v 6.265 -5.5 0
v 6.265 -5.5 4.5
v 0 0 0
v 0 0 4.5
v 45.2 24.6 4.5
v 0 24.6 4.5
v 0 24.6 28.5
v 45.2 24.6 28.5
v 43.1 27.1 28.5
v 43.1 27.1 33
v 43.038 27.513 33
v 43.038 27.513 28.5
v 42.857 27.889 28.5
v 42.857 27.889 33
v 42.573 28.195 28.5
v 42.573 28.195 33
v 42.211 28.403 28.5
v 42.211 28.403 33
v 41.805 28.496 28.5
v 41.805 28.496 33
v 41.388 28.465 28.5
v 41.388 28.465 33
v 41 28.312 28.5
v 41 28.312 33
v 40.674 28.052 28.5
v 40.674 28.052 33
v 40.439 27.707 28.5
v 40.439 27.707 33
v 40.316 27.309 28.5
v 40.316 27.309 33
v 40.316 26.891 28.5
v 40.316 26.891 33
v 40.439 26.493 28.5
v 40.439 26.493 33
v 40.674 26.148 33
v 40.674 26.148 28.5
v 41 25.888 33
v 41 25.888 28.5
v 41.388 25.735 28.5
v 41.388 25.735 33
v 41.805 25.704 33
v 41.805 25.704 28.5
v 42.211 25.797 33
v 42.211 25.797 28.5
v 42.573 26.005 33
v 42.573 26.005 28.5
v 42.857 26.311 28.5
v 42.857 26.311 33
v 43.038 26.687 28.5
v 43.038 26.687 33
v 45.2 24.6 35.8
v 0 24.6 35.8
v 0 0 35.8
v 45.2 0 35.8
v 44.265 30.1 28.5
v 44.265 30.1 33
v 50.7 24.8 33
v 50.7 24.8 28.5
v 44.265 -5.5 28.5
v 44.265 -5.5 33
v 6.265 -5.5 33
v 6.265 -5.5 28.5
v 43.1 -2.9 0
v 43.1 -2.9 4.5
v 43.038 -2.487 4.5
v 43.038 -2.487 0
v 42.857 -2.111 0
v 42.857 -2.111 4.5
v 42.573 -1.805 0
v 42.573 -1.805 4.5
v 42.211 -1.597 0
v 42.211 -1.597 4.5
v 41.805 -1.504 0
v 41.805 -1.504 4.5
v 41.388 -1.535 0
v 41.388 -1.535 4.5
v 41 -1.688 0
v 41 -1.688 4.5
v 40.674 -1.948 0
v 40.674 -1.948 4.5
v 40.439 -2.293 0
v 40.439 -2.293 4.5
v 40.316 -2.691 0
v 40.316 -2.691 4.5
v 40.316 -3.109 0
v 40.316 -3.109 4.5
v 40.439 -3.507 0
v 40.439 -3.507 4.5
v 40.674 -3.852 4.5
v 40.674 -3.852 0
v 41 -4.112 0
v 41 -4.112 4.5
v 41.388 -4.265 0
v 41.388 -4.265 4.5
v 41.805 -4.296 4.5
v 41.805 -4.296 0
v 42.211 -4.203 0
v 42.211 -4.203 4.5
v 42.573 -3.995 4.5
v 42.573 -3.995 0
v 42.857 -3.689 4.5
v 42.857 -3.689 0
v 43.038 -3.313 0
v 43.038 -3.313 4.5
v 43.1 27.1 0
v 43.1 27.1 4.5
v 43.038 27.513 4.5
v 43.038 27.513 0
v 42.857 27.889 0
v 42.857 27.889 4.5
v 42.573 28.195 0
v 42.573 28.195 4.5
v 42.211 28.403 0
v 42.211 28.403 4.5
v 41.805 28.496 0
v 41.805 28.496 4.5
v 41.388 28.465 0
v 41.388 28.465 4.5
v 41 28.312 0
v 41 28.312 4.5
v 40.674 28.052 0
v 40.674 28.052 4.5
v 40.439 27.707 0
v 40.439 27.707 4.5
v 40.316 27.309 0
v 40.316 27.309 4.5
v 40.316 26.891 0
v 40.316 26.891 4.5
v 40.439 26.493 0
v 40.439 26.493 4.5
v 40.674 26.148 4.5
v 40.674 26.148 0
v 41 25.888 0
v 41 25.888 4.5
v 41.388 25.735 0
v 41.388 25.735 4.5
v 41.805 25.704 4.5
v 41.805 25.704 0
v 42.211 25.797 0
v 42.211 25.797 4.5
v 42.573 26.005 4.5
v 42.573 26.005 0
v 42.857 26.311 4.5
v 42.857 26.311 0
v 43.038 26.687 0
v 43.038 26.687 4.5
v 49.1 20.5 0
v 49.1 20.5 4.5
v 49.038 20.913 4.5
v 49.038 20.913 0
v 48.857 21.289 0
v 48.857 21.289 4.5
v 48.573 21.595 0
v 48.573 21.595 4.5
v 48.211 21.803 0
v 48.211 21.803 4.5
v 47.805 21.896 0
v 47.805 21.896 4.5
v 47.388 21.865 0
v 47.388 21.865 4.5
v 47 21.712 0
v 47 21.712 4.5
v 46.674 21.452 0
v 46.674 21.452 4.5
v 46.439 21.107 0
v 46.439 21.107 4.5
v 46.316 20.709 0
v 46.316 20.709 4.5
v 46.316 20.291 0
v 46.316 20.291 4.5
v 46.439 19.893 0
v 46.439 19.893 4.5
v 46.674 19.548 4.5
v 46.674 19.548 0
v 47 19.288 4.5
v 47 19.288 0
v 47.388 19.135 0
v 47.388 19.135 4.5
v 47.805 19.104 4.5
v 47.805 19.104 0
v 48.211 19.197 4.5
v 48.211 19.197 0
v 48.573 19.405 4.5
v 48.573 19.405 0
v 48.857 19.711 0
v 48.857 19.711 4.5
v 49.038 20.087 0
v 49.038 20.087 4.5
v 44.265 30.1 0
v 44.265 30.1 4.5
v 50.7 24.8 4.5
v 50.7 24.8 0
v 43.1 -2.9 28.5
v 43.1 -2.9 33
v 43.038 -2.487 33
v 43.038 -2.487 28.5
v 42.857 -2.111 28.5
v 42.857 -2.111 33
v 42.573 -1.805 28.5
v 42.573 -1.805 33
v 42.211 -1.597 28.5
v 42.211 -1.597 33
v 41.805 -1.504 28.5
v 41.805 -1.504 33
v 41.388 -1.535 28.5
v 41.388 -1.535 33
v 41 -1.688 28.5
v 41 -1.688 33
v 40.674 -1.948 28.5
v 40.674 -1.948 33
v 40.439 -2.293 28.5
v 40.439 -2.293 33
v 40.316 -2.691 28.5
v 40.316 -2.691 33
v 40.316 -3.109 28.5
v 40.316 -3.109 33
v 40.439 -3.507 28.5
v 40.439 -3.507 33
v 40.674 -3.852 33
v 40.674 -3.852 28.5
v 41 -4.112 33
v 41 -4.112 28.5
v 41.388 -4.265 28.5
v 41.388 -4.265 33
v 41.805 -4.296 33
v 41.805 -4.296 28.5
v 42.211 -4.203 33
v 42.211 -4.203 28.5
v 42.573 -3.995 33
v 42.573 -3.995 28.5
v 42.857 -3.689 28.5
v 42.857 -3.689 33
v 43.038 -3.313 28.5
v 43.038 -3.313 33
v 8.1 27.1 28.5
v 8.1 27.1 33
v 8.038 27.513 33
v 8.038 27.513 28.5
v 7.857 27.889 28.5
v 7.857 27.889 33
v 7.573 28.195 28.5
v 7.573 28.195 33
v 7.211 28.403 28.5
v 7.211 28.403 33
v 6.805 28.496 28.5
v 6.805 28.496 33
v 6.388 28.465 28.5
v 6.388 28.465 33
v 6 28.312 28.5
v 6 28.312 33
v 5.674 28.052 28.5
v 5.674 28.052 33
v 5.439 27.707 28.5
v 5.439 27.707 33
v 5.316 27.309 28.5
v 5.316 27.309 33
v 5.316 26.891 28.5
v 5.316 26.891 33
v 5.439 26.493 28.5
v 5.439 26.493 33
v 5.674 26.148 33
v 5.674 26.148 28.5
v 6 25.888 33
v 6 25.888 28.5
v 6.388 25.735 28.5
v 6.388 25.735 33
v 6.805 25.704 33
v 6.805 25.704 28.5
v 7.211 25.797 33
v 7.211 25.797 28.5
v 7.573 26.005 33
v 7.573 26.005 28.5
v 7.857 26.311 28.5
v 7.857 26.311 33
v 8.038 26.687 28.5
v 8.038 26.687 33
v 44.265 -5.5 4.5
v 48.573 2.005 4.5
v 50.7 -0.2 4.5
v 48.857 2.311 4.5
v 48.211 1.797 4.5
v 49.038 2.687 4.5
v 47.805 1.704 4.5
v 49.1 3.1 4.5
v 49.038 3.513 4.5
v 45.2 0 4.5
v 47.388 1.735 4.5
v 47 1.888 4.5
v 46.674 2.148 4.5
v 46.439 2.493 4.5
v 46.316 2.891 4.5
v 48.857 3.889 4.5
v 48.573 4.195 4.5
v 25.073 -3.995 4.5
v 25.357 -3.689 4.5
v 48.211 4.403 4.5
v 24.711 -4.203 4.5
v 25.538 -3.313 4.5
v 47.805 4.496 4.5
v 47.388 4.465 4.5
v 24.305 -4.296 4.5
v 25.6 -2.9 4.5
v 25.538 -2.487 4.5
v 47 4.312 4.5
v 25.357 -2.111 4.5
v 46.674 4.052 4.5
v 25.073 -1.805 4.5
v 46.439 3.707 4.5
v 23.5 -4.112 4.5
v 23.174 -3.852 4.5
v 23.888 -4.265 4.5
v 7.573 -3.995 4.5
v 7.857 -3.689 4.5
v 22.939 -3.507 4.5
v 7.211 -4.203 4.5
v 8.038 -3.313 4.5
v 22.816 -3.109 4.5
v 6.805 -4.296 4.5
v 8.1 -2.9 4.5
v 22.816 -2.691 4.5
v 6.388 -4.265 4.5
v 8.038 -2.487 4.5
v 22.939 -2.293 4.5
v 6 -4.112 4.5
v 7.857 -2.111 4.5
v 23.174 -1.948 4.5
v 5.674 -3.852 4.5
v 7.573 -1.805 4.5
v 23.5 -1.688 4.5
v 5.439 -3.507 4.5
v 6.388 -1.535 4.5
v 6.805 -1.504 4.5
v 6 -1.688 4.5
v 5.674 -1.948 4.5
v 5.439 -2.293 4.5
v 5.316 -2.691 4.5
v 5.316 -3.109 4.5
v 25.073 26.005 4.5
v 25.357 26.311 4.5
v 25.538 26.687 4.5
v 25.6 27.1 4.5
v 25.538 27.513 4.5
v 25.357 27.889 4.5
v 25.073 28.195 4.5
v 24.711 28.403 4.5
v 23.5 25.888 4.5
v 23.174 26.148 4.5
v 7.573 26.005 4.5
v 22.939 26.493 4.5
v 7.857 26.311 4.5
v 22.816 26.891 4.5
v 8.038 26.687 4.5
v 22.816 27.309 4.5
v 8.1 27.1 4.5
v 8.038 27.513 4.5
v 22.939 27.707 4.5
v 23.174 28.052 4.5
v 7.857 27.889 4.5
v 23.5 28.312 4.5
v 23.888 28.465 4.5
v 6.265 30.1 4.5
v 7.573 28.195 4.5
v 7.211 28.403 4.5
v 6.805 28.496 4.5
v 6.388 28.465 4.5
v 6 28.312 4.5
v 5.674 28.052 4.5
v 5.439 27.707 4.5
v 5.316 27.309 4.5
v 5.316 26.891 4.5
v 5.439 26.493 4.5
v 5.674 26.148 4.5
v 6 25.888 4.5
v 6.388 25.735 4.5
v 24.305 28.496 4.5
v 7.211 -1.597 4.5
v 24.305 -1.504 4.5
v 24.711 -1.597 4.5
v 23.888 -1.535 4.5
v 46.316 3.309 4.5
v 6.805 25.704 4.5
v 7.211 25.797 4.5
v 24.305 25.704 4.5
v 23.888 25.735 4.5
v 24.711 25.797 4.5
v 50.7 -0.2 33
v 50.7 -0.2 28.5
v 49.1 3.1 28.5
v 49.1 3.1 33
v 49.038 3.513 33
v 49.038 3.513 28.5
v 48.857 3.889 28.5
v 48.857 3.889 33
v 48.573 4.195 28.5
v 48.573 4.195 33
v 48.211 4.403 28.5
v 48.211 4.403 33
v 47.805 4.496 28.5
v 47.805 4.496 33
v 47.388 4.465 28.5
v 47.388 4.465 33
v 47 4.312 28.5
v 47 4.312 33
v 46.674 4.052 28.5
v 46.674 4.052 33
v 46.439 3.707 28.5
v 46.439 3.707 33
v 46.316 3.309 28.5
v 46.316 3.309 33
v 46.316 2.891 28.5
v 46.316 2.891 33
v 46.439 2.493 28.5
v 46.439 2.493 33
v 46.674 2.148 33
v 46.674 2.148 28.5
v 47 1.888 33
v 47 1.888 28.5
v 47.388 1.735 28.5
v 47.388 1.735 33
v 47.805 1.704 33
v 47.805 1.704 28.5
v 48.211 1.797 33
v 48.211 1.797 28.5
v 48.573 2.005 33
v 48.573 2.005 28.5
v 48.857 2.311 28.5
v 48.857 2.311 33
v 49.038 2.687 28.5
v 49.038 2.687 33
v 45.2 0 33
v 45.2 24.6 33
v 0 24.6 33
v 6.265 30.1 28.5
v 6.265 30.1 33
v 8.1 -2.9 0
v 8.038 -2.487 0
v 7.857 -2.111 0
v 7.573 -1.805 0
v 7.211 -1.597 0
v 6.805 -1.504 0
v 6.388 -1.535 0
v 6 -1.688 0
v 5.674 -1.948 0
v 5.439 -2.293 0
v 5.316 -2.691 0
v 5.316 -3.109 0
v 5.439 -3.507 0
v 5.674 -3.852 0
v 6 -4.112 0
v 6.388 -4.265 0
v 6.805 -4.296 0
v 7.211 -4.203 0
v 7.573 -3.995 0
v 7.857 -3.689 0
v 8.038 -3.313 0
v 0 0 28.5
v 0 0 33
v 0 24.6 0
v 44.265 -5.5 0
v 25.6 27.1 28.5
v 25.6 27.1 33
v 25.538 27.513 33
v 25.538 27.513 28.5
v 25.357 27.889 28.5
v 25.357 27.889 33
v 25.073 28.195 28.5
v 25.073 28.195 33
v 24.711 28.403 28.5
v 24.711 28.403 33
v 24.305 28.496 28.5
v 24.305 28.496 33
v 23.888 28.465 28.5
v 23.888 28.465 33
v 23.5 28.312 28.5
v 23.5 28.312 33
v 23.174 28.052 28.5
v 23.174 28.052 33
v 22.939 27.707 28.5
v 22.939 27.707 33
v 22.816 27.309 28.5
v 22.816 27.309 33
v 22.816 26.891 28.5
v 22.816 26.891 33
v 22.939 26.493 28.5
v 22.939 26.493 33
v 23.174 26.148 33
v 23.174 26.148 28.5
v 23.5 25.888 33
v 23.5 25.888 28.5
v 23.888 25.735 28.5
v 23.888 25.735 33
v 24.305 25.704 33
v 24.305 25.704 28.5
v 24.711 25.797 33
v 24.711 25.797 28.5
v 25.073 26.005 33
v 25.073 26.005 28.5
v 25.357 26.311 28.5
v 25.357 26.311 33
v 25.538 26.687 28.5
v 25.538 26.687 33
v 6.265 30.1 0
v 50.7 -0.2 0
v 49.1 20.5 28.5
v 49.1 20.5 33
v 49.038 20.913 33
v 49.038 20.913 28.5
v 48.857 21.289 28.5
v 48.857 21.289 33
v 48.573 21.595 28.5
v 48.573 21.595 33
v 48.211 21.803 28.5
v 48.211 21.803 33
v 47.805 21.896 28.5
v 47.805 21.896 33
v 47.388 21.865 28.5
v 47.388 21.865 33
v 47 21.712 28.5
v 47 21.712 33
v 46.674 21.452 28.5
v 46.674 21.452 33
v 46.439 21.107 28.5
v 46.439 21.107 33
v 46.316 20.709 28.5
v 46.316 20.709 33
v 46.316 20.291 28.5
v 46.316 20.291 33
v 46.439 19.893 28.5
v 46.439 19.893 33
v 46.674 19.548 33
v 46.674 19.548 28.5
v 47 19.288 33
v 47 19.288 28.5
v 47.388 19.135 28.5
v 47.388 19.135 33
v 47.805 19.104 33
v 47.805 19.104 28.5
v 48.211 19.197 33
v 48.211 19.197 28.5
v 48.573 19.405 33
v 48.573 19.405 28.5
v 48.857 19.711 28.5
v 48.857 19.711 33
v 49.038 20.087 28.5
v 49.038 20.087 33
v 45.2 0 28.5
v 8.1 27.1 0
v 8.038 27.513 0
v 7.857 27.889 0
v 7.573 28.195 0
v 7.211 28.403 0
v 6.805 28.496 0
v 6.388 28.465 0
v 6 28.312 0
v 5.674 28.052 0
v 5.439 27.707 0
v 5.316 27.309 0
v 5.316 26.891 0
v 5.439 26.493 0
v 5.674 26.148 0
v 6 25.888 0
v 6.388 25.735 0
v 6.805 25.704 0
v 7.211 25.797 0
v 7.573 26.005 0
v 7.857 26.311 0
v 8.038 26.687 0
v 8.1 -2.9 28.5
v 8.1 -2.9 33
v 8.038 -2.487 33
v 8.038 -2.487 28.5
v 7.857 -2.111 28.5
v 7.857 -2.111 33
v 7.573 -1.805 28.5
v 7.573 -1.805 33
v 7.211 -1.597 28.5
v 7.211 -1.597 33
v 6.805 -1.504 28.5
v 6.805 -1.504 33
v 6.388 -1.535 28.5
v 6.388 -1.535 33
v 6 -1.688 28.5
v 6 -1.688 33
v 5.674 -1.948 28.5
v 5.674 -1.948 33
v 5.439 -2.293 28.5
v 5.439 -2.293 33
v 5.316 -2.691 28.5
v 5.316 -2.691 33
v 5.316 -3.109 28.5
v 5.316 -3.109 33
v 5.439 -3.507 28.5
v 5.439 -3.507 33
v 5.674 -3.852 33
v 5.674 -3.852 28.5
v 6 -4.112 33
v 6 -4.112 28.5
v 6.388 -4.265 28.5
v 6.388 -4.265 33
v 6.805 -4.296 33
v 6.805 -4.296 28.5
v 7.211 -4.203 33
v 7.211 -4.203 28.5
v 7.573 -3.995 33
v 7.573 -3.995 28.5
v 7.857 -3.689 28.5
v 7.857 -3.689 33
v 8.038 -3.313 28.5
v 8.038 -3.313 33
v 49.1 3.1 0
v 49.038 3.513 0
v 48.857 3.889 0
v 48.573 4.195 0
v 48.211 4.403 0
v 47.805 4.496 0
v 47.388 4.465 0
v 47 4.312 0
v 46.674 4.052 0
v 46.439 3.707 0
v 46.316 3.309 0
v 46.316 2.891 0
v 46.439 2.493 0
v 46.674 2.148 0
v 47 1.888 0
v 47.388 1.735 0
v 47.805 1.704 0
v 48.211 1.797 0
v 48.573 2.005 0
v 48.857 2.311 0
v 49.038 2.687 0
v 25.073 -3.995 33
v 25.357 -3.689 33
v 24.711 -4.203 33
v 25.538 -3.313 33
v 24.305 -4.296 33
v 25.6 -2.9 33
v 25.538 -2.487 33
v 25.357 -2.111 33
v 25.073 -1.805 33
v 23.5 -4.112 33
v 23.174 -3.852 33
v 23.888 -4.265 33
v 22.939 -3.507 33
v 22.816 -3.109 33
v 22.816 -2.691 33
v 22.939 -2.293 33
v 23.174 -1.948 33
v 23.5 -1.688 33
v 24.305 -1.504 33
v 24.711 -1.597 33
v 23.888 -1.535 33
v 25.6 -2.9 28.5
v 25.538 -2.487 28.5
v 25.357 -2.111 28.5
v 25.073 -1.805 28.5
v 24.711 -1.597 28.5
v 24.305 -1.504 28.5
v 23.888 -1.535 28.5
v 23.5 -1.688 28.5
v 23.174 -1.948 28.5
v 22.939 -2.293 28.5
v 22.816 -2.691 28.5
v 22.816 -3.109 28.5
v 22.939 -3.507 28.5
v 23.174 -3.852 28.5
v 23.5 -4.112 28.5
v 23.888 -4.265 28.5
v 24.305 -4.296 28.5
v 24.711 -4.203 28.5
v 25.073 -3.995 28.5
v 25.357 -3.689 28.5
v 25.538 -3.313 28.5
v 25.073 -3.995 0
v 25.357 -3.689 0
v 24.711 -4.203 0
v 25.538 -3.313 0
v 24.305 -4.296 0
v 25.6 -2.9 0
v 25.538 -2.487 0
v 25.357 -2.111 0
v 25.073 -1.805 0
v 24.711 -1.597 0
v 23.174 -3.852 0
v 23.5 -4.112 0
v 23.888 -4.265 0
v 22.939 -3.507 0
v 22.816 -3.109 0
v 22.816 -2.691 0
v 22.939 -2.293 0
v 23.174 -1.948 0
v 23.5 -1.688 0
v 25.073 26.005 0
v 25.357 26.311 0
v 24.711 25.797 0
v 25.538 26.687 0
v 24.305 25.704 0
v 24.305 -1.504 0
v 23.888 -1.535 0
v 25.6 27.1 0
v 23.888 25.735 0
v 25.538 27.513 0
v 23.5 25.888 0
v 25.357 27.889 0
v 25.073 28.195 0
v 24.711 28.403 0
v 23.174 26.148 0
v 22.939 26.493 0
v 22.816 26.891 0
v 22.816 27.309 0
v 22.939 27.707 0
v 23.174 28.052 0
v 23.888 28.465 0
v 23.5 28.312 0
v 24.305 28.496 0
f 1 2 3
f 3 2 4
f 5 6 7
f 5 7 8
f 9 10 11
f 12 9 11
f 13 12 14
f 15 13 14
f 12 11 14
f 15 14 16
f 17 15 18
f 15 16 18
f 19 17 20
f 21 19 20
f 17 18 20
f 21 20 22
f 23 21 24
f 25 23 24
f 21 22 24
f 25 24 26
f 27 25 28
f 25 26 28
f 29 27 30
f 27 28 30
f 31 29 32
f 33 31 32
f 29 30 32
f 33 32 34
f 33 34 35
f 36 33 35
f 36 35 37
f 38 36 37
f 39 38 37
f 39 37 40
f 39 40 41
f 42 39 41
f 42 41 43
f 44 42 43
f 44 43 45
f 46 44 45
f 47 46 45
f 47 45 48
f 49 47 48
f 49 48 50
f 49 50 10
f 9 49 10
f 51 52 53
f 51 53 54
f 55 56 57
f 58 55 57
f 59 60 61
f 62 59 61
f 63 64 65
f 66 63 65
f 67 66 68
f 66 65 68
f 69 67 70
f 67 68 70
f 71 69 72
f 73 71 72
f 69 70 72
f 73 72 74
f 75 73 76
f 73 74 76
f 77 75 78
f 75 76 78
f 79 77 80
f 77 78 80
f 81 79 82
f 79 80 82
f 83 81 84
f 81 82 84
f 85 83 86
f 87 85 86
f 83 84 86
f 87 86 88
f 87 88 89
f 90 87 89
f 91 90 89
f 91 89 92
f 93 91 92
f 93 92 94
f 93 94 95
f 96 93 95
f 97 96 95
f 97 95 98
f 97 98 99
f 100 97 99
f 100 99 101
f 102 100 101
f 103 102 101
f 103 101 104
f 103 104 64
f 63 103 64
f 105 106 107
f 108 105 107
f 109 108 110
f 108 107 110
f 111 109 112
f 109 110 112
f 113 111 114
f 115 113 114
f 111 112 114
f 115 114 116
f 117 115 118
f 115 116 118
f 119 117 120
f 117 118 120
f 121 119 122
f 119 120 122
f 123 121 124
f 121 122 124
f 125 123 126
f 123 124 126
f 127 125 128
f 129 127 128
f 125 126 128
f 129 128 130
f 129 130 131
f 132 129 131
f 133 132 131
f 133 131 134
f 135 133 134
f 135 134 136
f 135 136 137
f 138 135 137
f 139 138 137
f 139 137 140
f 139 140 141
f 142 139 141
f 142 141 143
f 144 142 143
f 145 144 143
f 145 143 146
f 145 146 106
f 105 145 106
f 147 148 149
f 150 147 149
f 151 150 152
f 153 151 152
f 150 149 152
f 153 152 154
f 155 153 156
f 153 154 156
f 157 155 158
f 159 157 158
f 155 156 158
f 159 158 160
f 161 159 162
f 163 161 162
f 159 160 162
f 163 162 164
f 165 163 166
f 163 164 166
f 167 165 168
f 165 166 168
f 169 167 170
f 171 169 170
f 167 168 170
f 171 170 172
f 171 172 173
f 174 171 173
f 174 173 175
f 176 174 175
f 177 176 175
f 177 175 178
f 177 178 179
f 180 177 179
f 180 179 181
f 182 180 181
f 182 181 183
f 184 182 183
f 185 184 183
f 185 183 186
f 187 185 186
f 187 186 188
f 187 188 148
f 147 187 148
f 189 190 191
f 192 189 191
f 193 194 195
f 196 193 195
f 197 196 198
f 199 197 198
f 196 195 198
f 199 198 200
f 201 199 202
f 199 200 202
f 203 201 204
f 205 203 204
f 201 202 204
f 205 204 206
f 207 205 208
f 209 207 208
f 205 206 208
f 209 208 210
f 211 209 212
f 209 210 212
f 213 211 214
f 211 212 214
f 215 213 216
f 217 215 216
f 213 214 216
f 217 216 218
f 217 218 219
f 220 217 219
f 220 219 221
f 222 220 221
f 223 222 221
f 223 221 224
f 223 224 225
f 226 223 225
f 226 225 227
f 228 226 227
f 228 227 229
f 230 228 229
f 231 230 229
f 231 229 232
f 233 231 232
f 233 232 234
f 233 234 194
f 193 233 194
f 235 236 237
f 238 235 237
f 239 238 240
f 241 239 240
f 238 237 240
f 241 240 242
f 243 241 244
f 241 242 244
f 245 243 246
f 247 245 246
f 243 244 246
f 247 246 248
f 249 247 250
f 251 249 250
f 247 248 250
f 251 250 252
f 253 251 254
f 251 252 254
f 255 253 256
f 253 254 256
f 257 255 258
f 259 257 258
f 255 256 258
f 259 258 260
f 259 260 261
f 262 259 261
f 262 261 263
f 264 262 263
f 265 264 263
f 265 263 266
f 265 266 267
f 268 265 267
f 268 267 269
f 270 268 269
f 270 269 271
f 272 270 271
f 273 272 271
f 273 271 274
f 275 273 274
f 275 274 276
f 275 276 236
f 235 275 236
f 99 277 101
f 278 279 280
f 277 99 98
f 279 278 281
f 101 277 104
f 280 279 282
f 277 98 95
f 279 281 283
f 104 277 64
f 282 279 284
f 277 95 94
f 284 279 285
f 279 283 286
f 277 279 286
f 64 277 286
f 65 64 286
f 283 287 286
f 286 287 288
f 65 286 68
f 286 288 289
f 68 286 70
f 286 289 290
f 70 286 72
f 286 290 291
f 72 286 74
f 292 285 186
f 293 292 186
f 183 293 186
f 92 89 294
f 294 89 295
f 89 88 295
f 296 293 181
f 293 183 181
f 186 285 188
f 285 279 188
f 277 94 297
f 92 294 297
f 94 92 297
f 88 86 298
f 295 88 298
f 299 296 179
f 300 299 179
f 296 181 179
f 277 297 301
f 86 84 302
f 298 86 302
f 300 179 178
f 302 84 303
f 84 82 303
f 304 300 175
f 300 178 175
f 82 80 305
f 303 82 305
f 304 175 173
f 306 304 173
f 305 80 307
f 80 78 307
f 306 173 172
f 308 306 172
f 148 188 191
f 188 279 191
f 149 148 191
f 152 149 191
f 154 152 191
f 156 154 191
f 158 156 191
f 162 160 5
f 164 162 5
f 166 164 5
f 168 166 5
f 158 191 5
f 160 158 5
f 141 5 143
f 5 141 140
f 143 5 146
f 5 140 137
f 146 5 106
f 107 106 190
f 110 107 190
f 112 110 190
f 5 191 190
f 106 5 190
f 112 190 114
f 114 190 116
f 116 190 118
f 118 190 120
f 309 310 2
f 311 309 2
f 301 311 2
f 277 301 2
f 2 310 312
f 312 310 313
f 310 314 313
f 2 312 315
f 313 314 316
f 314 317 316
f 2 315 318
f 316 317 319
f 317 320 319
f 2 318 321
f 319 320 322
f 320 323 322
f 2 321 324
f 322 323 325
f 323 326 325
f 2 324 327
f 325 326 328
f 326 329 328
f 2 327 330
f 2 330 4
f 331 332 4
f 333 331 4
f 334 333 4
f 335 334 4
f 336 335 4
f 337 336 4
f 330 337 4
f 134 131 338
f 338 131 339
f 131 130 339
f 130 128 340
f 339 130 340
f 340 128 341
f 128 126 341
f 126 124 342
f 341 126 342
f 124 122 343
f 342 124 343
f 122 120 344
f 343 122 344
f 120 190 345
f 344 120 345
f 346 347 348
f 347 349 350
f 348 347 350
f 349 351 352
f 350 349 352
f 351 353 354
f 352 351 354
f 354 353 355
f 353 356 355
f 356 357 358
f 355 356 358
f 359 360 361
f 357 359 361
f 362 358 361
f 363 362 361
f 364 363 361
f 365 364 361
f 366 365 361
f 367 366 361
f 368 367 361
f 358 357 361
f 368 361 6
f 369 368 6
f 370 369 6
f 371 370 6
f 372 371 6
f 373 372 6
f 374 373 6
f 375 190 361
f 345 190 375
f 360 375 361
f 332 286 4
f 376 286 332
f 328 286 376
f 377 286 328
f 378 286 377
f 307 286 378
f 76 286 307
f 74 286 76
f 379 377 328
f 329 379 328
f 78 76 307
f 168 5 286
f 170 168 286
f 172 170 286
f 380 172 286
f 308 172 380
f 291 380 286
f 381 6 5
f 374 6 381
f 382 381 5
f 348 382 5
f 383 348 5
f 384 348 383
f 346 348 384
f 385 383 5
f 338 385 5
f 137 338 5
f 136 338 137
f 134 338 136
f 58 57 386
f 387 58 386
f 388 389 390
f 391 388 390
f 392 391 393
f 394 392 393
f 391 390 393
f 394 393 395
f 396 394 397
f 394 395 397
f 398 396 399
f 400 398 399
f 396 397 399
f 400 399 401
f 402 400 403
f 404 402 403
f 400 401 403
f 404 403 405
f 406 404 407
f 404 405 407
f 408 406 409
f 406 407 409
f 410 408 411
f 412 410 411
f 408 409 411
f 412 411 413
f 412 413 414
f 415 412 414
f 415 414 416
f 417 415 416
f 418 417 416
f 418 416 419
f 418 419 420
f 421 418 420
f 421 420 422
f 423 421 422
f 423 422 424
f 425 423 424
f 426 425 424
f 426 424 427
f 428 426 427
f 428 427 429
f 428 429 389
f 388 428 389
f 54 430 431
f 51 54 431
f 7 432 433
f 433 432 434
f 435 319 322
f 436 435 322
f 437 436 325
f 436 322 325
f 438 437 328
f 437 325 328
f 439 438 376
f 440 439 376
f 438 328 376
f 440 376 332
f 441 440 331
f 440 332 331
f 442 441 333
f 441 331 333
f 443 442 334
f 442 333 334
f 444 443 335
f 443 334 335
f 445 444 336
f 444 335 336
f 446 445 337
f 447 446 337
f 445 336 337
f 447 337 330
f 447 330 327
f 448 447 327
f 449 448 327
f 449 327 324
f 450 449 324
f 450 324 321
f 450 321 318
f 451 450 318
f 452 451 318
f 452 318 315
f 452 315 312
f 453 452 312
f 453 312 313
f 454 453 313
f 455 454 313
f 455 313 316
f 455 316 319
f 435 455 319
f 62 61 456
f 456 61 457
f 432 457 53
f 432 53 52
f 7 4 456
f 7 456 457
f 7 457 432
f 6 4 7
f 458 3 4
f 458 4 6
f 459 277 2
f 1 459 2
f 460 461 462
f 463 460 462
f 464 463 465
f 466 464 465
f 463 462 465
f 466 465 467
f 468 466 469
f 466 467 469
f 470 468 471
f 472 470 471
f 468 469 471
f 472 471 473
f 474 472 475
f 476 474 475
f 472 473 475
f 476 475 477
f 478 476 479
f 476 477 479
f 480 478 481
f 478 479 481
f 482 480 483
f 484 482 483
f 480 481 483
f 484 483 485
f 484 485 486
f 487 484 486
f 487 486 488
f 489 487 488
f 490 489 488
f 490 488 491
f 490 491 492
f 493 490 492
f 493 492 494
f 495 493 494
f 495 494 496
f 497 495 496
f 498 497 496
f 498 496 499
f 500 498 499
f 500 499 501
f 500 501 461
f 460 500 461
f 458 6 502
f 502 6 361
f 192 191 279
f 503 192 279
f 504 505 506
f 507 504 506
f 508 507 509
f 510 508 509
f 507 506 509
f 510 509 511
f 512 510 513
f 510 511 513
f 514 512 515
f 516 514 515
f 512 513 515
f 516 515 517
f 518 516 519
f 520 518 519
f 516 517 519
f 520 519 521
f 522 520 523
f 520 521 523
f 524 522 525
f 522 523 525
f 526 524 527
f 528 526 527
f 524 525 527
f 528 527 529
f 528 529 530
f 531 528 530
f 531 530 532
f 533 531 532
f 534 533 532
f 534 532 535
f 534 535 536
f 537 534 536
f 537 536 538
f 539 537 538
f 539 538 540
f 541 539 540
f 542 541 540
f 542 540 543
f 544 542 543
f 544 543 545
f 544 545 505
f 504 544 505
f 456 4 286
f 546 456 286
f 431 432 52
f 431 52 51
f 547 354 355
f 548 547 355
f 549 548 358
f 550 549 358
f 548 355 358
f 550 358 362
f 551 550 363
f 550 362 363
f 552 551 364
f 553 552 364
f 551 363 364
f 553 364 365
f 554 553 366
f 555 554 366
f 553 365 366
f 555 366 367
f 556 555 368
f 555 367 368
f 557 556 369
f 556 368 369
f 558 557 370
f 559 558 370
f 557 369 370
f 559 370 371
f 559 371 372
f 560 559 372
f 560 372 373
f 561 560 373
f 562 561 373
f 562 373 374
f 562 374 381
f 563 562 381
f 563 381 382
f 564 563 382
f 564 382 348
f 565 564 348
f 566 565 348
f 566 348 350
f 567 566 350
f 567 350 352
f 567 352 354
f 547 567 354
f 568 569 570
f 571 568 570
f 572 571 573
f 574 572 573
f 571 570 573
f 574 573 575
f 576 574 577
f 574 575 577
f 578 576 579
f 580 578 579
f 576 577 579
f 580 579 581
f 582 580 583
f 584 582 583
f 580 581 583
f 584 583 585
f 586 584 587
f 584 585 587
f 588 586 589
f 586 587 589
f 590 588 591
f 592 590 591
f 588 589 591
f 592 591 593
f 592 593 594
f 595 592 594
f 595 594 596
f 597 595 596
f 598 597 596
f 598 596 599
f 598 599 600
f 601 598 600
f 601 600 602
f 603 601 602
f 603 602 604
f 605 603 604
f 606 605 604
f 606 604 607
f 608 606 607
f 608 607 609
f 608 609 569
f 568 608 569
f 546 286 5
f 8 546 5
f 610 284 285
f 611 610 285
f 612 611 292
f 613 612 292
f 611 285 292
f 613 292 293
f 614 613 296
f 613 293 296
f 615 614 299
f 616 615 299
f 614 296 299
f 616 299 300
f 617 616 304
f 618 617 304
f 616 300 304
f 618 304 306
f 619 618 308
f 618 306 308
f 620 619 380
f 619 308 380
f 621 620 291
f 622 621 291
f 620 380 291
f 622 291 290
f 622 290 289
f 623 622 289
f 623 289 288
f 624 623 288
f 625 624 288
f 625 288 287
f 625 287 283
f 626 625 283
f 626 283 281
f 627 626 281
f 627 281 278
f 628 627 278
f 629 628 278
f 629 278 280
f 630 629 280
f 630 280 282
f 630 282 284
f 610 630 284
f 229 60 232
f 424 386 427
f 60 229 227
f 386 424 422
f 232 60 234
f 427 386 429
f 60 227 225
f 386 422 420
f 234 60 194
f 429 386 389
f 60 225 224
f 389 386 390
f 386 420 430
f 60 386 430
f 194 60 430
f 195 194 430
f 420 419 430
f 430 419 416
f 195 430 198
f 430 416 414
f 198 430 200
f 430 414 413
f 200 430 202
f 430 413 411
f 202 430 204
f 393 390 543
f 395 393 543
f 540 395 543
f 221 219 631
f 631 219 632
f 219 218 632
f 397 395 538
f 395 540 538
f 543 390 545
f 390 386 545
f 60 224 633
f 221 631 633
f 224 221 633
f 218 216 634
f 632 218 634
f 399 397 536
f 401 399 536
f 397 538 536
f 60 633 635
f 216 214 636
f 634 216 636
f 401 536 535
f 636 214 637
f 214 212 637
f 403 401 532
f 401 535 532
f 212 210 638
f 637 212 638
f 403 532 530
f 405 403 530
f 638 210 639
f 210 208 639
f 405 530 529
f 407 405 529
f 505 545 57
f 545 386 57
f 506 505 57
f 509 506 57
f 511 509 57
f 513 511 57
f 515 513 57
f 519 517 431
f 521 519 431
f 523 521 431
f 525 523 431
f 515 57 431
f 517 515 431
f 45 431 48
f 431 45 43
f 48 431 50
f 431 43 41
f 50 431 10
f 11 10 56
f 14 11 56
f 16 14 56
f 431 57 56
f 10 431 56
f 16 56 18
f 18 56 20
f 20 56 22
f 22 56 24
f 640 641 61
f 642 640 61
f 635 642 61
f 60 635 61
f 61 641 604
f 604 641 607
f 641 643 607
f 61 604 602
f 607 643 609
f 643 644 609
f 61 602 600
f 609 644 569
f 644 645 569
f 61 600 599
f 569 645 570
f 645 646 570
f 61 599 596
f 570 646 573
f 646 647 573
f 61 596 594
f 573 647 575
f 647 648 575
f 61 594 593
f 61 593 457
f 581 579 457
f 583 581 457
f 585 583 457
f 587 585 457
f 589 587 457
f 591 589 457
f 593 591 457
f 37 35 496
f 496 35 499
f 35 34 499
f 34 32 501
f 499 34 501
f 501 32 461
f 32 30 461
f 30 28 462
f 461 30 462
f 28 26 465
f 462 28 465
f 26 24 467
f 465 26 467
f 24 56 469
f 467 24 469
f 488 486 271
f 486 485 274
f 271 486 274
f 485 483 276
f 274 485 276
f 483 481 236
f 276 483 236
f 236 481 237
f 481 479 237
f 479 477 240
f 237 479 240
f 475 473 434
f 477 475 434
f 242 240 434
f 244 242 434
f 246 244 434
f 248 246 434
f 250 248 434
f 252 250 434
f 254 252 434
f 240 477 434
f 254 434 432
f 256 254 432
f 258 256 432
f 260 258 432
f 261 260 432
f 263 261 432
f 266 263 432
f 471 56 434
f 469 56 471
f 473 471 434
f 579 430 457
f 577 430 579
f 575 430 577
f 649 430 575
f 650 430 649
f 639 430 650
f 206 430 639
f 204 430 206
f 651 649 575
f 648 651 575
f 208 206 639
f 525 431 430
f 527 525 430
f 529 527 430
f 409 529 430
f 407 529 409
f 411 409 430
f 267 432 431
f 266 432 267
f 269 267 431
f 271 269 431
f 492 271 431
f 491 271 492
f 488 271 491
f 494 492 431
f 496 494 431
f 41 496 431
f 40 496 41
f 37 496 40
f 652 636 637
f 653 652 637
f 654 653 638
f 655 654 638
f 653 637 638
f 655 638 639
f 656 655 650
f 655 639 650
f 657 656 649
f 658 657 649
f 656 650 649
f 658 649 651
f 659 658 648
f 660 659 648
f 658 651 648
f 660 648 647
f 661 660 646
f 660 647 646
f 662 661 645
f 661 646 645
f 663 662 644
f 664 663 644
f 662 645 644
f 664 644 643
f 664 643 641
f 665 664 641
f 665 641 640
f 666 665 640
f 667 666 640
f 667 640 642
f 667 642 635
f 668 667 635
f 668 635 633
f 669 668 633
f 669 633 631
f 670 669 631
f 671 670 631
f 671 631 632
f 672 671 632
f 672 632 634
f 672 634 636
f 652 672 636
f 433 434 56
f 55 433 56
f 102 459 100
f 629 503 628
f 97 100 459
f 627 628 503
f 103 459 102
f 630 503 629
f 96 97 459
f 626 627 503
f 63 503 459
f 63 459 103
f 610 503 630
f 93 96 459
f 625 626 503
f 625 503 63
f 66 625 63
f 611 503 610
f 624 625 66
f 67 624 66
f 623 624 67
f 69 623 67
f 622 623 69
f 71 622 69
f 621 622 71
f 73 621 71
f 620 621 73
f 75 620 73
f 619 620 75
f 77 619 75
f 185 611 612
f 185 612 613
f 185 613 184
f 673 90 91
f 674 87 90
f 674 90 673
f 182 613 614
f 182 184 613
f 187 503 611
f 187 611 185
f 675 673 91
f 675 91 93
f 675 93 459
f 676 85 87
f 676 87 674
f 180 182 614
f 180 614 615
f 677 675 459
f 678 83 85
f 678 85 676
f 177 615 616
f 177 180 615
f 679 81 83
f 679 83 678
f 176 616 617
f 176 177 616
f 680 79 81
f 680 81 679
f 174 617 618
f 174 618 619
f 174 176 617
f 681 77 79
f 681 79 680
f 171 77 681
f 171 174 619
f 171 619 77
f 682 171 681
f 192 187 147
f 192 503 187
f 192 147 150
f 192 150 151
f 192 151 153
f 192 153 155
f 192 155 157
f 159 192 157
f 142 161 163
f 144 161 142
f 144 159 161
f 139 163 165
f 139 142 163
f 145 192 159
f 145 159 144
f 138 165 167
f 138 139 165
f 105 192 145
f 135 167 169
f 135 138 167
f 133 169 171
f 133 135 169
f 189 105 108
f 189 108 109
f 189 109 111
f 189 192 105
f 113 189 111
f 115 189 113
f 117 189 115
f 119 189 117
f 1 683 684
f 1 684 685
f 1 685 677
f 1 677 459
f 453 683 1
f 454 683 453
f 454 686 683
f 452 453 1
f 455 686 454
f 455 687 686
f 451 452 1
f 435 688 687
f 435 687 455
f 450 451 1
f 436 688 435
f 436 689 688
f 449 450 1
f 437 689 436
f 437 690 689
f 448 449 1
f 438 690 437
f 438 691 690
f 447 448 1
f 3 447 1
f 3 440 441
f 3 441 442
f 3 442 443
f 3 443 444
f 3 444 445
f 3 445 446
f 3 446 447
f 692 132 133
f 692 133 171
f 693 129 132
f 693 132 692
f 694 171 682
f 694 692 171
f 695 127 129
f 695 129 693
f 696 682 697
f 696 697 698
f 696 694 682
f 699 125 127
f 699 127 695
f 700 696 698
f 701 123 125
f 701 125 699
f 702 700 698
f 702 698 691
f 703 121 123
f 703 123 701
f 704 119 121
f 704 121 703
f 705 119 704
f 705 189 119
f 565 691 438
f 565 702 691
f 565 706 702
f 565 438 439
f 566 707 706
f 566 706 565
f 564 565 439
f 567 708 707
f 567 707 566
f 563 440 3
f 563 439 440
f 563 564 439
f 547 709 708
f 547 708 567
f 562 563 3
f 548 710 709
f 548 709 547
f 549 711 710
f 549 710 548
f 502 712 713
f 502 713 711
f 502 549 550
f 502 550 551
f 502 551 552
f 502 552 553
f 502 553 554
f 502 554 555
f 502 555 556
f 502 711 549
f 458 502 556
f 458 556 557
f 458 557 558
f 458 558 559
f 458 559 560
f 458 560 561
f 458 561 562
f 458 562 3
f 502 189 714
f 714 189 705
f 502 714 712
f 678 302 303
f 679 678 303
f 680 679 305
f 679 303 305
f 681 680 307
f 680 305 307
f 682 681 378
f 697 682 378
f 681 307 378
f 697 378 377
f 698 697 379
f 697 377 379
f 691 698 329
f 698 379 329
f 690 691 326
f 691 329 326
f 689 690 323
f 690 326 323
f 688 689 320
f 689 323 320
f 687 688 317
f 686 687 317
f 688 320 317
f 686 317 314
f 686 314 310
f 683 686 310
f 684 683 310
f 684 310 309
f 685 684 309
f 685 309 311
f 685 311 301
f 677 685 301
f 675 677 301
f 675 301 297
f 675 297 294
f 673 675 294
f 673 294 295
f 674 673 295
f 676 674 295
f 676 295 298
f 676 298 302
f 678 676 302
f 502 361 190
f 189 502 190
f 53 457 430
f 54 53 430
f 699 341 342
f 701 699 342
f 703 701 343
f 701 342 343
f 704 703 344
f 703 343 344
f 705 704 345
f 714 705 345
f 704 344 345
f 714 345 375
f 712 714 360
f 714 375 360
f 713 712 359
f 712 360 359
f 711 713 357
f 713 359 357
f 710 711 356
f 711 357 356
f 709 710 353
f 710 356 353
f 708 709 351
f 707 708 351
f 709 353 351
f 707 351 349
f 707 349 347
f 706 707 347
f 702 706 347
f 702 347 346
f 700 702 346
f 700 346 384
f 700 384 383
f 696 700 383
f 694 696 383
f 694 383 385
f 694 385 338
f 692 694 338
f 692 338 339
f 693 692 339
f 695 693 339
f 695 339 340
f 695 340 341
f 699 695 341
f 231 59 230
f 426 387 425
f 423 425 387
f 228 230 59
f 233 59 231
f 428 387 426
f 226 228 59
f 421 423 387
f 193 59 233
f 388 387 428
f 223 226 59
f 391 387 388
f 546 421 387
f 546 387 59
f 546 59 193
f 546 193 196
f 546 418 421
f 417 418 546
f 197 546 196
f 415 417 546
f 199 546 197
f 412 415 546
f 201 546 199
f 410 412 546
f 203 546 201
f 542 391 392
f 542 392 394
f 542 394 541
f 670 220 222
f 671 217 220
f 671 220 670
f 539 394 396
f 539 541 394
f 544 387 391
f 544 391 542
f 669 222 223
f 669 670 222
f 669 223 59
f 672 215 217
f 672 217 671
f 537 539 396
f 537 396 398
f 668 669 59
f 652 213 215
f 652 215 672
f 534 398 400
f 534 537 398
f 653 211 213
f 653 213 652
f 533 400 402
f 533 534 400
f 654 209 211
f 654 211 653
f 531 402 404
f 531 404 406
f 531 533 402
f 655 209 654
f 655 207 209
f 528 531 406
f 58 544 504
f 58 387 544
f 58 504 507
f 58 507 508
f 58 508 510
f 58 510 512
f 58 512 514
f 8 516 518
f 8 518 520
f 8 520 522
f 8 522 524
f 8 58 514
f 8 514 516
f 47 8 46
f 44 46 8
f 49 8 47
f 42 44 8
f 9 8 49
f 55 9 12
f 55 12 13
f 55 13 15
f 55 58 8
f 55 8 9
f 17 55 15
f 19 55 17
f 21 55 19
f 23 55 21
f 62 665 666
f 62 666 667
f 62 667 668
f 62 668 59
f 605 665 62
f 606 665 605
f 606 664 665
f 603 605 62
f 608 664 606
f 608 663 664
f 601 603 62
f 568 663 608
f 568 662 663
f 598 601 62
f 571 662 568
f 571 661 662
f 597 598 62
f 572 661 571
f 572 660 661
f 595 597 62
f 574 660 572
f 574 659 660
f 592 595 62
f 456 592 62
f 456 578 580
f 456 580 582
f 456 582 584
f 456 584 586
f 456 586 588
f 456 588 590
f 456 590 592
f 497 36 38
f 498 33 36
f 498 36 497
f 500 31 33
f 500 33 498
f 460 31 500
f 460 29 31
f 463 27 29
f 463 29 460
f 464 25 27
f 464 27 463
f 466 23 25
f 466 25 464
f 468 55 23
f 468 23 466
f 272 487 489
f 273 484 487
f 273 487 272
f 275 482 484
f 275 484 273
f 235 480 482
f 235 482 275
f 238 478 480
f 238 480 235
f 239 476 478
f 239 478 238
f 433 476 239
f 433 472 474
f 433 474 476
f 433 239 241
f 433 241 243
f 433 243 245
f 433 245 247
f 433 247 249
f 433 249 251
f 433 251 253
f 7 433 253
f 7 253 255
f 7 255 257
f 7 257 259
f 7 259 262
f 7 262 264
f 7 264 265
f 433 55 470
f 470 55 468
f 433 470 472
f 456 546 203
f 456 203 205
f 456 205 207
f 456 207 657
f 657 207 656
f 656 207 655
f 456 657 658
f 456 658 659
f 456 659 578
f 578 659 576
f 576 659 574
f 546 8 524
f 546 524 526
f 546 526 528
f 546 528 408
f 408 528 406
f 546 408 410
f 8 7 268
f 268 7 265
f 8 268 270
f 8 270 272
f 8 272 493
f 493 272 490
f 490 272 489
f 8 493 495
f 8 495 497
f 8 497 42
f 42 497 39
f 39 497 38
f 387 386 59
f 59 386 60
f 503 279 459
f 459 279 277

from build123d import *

# Parameters (mm, degrees)
SKETCH1_W                 = 45.2
SKETCH1_H                 = 24.6
BOSS_EXTRUDE1_DEPTH       = 35.8
BOSS_EXTRUDE2_DEPTH       = 4.5
SKETCH4_R                 = 1.4
CUT_EXTRUDE1_DEPTH        = 68.568483778
LPATTERN1_COUNT           = 3
LPATTERN1_PITCH           = 17.5
LPATTERN1_COUNT_DIR2      = 2
LPATTERN1_PITCH_DIR2      = 30
SKETCH6_R                 = 1.4
CUT_EXTRUDE2_DEPTH        = 68.568483778
LPATTERN2_COUNT           = 2
LPATTERN2_PITCH           = 28.5
LPATTERN2_COPY_1_SKETCH_R = 1.4
LPATTERN2_COPY_1_DEPTH    = 68.568483778
LPATTERN2_COPY_2_SKETCH_R = 1.4
LPATTERN2_COPY_2_DEPTH    = 68.568483778
LPATTERN2_COPY_3_SKETCH_R = 1.4
LPATTERN2_COPY_3_DEPTH    = 68.568483778
LPATTERN2_COPY_4_SKETCH_R = 1.4
LPATTERN2_COPY_4_DEPTH    = 68.568483778
LPATTERN2_COPY_5_SKETCH_R = 1.4
LPATTERN2_COPY_5_DEPTH    = 68.568483778


with BuildPart() as part:
    # Sketch1 → Boss-Extrude1 (new body)
    with BuildSketch(Plane.XY):
        with Locations((22.6, 12.3)):
            Rectangle(SKETCH1_W, SKETCH1_H)
    extrude(amount=BOSS_EXTRUDE1_DEPTH)

    # Sketch3 → Boss-Extrude2 (add)
    with BuildSketch(Plane.XY.offset(33)):
        Polygon((0, 24.6), (6.26496063, 30.1), (44.26496063, 30.1), (50.7, 24.8), (50.7, -0.2), (44.26496063, -5.5), (6.26496063, -5.5), (0, 0), (45.2, 0), (45.2, 24.6), align=None)
    boss_extrude2 = extrude(amount=-BOSS_EXTRUDE2_DEPTH)

    # Sketch4 → Cut-Extrude1 (cut, through all)
    with BuildSketch(Plane.XY.offset(33)):
        with Locations((6.7, 27.1)):
            Circle(SKETCH4_R)
    cut_extrude1 = extrude(amount=-CUT_EXTRUDE1_DEPTH, mode=Mode.SUBTRACT)

    # LPattern1: Cut-Extrude1 3 × 2
    with Locations(*[(i * LPATTERN1_PITCH, -j * LPATTERN1_PITCH_DIR2, 0) for i in range(LPATTERN1_COUNT) for j in range(LPATTERN1_COUNT_DIR2) if (i, j) != (0, 0)]):
        add(cut_extrude1, mode=Mode.SUBTRACT)

    # Sketch6 → Cut-Extrude2 (cut, through all)
    with BuildSketch(Plane.XY.offset(33)):
        with Locations((47.7, 20.5)):
            Circle(SKETCH6_R)
        with Locations((47.7, 3.1)):
            Circle(SKETCH6_R)
    cut_extrude2 = extrude(amount=-CUT_EXTRUDE2_DEPTH, mode=Mode.SUBTRACT)

    # LPattern2: Boss-Extrude2, Cut-Extrude1, Cut-Extrude2 ×2
    with Locations(*[(0, 0, -i * LPATTERN2_PITCH) for i in range(1, LPATTERN2_COUNT)]):
        add(boss_extrude2)
        add(cut_extrude1, mode=Mode.SUBTRACT)
        add(cut_extrude2, mode=Mode.SUBTRACT)

    # LPattern2 copy 1 sketch → LPattern2 copy 1 (cut, through all)
    with BuildSketch(Plane(origin=(0, -30, 4.5), x_dir=(1, 0, 0), z_dir=(0, 0, 1))):
        with Locations((6.7, 27.1)):
            Circle(LPATTERN2_COPY_1_SKETCH_R)
    extrude(amount=-LPATTERN2_COPY_1_DEPTH, mode=Mode.SUBTRACT)

    # LPattern2 copy 2 sketch → LPattern2 copy 2 (cut, through all)
    with BuildSketch(Plane(origin=(17.5, 0, 4.5), x_dir=(1, 0, 0), z_dir=(0, 0, 1))):
        with Locations((6.7, 27.1)):
            Circle(LPATTERN2_COPY_2_SKETCH_R)
    extrude(amount=-LPATTERN2_COPY_2_DEPTH, mode=Mode.SUBTRACT)

    # LPattern2 copy 3 sketch → LPattern2 copy 3 (cut, through all)
    with BuildSketch(Plane(origin=(17.5, -30, 4.5), x_dir=(1, 0, 0), z_dir=(0, 0, 1))):
        with Locations((6.7, 27.1)):
            Circle(LPATTERN2_COPY_3_SKETCH_R)
    extrude(amount=-LPATTERN2_COPY_3_DEPTH, mode=Mode.SUBTRACT)

    # LPattern2 copy 4 sketch → LPattern2 copy 4 (cut, through all)
    with BuildSketch(Plane(origin=(35, 0, 4.5), x_dir=(1, 0, 0), z_dir=(0, 0, 1))):
        with Locations((6.7, 27.1)):
            Circle(LPATTERN2_COPY_4_SKETCH_R)
    extrude(amount=-LPATTERN2_COPY_4_DEPTH, mode=Mode.SUBTRACT)

    # LPattern2 copy 5 sketch → LPattern2 copy 5 (cut, through all)
    with BuildSketch(Plane(origin=(35, -30, 4.5), x_dir=(1, 0, 0), z_dir=(0, 0, 1))):
        with Locations((6.7, 27.1)):
            Circle(LPATTERN2_COPY_5_SKETCH_R)
    extrude(amount=-LPATTERN2_COPY_5_DEPTH, mode=Mode.SUBTRACT)


solid = part.part
